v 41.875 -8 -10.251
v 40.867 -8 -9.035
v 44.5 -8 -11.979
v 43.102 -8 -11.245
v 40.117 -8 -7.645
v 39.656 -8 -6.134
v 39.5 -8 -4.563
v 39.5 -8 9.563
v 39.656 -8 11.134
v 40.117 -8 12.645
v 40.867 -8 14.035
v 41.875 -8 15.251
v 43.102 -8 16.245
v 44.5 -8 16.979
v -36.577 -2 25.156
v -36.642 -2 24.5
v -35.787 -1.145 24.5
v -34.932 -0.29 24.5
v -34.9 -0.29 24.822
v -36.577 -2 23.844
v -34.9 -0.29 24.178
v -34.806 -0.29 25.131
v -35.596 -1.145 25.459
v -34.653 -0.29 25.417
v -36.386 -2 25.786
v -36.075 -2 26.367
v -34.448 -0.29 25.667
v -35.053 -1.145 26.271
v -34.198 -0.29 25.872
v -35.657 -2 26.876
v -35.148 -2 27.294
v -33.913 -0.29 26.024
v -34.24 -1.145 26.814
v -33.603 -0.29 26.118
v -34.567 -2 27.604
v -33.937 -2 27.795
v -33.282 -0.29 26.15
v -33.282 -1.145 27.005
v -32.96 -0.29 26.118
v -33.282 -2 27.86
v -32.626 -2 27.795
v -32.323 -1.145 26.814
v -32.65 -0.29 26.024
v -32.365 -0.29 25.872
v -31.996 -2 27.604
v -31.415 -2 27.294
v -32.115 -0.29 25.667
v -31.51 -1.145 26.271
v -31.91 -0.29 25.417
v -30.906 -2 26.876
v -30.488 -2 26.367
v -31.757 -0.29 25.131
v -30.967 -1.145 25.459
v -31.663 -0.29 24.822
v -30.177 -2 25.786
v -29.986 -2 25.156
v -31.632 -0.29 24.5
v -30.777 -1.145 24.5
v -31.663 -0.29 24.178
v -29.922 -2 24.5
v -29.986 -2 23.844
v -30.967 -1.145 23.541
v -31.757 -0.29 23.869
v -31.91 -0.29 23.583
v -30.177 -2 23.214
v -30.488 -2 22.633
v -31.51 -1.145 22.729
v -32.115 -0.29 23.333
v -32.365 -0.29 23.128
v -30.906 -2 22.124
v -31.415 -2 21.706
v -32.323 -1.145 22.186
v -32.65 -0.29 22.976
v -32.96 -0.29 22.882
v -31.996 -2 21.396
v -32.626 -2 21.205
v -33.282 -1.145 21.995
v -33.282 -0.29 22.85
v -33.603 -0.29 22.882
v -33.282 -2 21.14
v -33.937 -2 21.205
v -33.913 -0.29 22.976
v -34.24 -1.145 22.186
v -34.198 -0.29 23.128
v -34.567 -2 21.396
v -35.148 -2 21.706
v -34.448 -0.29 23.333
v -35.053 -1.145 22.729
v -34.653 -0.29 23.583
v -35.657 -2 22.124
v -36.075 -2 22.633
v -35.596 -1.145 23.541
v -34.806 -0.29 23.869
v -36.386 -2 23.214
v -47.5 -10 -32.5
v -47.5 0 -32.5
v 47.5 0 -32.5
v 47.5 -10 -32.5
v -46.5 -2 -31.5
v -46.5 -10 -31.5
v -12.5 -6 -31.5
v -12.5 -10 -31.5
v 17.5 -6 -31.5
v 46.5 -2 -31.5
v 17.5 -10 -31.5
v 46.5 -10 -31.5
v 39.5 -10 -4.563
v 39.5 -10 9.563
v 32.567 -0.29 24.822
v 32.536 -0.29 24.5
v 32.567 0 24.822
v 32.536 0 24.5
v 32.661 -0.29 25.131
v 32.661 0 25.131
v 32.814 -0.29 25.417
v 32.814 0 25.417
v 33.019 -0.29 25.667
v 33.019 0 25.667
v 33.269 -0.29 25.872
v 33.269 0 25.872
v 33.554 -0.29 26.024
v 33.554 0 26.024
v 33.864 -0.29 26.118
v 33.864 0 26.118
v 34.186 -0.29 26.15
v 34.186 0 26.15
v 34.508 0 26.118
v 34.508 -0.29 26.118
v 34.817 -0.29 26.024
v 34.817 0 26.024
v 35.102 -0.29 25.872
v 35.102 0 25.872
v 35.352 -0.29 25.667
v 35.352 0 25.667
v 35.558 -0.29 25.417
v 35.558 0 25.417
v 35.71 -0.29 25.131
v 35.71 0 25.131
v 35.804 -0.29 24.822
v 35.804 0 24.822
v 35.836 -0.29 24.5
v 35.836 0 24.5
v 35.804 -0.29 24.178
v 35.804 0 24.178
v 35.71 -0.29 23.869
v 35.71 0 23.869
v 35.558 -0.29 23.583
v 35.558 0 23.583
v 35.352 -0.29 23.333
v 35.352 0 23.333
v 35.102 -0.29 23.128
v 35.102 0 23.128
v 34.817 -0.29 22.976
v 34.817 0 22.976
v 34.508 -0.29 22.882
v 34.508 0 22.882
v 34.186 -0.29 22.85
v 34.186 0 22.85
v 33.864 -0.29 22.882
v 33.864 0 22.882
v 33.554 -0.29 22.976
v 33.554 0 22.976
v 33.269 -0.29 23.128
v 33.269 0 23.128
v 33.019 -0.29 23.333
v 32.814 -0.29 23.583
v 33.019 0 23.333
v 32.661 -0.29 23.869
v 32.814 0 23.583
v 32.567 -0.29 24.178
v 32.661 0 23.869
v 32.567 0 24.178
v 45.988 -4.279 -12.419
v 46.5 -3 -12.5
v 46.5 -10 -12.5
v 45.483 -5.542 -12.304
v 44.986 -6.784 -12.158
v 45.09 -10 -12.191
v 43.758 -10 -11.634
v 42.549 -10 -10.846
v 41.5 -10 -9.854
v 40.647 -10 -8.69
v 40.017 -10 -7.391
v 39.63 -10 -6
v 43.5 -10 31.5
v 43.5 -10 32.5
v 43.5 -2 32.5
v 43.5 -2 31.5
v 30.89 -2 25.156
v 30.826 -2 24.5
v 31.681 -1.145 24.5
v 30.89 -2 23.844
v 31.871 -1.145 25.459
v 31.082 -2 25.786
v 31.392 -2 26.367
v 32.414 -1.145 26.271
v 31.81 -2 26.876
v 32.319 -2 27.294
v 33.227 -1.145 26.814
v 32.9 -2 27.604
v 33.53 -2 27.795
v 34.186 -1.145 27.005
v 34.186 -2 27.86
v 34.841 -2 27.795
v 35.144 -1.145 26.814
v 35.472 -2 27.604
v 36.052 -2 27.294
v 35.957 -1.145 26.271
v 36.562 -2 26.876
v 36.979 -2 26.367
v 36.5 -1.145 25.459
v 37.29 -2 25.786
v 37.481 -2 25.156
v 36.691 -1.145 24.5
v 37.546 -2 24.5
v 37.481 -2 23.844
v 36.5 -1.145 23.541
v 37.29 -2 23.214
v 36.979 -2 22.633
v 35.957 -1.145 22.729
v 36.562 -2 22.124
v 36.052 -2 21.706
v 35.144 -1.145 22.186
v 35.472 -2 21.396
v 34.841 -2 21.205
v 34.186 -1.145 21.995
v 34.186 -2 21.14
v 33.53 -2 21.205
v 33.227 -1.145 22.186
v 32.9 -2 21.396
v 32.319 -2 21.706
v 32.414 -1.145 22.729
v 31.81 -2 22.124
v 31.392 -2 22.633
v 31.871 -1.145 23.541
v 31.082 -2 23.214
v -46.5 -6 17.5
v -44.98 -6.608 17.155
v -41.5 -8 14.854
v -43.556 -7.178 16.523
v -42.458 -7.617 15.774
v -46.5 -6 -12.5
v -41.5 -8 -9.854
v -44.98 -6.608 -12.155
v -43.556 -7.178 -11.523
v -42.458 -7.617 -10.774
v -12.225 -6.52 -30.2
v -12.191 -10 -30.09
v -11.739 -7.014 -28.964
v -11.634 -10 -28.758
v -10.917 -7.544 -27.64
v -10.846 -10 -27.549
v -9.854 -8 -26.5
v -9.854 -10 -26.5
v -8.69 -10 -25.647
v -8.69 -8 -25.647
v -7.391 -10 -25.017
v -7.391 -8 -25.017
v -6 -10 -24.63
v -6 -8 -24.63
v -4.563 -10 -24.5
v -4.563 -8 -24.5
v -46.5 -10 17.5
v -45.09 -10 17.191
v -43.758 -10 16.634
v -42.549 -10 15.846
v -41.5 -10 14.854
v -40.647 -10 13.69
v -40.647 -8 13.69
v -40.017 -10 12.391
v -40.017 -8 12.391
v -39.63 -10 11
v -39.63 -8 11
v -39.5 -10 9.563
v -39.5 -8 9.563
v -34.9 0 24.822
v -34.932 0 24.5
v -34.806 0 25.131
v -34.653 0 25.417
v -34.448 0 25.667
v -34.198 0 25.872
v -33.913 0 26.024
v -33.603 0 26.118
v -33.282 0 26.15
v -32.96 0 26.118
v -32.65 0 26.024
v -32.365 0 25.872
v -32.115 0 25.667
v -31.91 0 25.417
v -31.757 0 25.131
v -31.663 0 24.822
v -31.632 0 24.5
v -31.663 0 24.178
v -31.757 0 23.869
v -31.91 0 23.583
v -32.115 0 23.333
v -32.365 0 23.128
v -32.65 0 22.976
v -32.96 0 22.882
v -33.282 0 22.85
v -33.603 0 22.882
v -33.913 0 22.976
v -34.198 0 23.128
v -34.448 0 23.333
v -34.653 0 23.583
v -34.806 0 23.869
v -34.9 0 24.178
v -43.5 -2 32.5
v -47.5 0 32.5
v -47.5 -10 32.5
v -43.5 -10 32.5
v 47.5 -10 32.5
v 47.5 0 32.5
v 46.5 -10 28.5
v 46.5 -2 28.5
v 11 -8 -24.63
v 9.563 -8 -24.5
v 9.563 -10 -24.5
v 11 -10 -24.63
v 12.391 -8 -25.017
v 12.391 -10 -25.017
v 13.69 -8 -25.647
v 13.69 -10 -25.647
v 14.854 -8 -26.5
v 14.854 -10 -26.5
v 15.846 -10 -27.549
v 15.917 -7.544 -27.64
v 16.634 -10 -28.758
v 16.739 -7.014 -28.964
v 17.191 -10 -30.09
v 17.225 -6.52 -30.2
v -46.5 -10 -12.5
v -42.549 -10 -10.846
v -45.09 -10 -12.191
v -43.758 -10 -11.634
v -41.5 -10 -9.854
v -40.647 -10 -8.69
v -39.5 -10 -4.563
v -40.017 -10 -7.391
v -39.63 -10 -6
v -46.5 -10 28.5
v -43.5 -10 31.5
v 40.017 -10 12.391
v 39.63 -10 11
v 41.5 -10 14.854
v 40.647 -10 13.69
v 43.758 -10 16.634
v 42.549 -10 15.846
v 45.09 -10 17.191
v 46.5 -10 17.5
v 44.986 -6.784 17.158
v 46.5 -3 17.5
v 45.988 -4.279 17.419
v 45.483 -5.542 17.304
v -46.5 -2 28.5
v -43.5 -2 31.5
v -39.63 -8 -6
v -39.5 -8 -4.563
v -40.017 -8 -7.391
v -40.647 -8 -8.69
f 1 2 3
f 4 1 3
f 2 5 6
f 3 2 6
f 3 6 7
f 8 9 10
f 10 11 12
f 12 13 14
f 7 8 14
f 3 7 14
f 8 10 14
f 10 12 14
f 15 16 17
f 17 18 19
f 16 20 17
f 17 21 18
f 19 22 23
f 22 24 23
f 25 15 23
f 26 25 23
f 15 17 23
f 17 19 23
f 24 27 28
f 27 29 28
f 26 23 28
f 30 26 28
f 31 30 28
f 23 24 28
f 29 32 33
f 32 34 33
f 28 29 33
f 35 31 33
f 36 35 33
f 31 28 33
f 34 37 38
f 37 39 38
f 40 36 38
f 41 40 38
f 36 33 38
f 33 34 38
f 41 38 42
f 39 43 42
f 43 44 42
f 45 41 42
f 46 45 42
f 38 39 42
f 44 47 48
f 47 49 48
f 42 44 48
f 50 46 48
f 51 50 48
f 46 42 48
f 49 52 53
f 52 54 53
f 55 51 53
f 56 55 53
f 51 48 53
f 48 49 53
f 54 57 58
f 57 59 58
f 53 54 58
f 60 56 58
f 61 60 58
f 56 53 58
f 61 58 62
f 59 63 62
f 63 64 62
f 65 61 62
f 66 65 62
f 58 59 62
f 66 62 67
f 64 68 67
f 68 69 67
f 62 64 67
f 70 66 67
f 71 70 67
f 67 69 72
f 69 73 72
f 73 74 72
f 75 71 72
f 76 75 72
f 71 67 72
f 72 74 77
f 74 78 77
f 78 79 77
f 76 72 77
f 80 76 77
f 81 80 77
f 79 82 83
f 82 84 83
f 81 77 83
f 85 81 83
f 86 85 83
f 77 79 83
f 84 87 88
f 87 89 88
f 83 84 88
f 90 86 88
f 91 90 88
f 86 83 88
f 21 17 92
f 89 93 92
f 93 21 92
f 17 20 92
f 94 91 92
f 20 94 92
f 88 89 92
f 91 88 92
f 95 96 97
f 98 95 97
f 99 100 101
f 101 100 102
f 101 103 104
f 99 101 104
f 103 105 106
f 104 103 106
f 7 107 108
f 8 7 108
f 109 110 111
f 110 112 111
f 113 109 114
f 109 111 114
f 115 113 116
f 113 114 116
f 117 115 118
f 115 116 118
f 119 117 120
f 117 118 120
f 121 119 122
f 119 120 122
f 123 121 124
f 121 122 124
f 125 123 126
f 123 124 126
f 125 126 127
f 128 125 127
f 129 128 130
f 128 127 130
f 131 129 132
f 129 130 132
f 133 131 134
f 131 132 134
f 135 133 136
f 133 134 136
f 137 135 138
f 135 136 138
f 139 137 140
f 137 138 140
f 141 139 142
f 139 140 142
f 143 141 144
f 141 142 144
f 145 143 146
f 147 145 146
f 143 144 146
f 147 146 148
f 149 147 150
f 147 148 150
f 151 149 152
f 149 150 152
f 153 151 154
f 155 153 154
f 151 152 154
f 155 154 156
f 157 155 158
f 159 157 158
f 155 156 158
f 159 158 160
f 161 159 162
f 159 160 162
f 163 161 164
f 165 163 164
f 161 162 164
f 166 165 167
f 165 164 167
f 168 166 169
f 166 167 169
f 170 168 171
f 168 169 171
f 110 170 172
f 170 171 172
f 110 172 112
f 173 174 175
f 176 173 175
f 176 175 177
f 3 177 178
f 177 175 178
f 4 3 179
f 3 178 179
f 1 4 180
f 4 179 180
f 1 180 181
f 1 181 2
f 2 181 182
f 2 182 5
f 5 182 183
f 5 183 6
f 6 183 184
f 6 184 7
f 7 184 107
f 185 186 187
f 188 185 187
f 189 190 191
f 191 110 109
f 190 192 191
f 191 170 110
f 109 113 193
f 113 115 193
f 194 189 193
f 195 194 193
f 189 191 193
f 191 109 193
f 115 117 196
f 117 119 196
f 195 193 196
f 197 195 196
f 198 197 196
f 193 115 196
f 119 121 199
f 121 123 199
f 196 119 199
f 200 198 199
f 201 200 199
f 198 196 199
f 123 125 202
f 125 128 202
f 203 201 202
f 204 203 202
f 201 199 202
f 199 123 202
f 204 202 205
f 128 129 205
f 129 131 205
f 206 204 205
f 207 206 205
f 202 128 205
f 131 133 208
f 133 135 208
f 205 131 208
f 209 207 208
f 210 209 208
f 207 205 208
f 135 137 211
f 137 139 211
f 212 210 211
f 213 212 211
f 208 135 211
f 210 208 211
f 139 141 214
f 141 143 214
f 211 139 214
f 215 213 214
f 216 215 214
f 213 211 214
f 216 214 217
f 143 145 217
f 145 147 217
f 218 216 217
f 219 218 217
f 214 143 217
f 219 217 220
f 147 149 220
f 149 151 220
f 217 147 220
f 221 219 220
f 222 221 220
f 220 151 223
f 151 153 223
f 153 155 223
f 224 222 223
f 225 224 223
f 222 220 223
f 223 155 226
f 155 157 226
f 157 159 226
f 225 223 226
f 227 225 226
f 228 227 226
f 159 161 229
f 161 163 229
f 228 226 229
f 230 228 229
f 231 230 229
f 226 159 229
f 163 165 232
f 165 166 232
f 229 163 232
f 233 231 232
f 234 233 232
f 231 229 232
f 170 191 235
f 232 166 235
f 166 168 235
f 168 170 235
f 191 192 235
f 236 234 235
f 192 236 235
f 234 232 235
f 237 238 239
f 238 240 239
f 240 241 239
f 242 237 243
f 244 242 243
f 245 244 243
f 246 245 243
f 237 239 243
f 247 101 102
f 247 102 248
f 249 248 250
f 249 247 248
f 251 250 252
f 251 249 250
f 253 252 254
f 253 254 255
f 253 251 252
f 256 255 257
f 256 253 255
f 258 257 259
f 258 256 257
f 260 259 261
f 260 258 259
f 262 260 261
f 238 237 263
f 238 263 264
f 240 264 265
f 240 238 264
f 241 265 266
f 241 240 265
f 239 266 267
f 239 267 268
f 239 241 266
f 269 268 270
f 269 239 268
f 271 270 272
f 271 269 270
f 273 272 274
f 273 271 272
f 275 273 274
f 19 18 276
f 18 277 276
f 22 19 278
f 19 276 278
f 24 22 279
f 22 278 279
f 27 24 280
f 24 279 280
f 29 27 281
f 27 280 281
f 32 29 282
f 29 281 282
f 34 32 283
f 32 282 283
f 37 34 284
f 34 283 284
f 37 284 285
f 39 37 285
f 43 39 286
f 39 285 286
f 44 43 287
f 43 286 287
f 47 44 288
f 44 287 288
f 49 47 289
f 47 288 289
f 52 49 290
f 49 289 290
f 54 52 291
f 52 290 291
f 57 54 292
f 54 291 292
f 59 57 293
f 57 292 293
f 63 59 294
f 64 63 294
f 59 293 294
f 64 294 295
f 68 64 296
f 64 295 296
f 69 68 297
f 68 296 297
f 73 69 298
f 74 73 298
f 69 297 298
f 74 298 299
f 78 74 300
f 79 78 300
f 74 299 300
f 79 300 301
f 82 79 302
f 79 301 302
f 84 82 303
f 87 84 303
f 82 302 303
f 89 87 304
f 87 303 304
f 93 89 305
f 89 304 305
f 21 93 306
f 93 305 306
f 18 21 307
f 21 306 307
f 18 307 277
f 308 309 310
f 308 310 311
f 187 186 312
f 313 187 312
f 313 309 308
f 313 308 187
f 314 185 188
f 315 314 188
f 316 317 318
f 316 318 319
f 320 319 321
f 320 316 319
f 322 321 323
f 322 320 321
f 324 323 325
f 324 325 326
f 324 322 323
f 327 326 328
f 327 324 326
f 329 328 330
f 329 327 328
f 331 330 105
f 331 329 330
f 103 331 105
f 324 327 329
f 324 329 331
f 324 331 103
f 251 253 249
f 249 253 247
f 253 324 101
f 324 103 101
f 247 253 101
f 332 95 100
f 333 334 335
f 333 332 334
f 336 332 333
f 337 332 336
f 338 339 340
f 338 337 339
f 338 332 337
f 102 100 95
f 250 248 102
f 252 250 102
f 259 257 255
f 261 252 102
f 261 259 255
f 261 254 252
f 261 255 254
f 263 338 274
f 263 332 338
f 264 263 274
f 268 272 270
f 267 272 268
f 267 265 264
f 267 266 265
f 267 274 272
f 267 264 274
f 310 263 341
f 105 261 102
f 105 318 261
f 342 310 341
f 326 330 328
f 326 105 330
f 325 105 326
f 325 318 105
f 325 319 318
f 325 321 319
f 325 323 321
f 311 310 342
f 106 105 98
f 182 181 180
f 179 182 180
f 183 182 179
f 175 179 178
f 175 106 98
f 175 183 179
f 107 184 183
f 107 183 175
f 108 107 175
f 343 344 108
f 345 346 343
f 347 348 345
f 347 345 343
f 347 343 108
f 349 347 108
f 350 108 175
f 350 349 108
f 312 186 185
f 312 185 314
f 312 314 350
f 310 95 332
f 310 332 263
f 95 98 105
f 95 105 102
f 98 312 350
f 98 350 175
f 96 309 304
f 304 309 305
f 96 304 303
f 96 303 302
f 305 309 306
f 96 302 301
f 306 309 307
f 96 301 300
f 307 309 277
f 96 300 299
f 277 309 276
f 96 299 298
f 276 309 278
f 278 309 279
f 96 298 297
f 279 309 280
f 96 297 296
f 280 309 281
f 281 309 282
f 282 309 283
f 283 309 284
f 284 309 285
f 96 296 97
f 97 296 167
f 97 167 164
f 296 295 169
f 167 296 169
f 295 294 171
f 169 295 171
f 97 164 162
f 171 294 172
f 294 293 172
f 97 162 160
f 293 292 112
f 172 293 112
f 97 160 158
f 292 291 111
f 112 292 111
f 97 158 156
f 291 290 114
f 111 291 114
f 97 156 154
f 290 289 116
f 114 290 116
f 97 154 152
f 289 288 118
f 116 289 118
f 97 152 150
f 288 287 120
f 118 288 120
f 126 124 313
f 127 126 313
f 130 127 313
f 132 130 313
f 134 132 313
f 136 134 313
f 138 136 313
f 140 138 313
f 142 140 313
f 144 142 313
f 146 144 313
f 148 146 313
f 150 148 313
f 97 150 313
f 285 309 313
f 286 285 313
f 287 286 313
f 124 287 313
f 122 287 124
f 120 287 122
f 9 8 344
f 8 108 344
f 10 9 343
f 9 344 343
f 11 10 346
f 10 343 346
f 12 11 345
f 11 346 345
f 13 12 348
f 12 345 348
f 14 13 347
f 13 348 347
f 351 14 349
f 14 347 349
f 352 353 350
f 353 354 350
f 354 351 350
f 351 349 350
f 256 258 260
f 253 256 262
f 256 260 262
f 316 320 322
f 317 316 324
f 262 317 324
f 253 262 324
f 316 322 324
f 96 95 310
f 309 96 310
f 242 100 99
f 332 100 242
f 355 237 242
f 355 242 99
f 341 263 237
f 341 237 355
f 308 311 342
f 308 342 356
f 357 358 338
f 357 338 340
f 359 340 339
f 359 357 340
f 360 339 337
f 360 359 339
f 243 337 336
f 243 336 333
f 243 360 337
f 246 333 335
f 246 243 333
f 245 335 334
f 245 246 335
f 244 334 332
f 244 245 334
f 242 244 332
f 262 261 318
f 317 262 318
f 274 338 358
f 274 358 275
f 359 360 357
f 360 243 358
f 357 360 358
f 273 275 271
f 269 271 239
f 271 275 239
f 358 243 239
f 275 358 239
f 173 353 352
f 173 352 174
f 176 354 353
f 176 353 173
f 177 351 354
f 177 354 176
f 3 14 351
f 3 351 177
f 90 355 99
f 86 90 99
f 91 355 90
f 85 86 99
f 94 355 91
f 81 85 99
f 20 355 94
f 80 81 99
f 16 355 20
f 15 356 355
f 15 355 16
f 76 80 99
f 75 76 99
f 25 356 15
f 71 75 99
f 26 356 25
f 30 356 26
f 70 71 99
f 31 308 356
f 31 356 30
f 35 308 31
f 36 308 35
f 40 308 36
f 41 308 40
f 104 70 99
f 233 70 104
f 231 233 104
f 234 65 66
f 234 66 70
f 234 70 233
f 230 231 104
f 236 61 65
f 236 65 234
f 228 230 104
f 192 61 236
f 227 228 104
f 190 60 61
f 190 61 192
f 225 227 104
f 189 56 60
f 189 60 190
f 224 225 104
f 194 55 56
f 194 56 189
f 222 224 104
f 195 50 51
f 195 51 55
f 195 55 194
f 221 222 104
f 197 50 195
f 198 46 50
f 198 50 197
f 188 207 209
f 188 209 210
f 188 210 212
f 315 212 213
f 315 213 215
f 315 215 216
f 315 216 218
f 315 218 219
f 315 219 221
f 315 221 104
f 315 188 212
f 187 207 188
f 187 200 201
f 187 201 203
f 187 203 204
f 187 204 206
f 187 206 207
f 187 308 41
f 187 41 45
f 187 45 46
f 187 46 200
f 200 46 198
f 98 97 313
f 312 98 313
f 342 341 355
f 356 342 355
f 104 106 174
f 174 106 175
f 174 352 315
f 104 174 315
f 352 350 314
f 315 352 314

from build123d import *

# Parameters (mm, degrees)
F0_W            = 95
F0_H            = 65
F1_DEPTH        = 10
F2_W            = 93
F2_H            = 63
F3_DEPTH        = 8
F4_W            = 8
F4_H            = 30
F4_W_2          = 30
F4_H_2          = 8
F5_DEPTH        = 2
F6_T1_DEPTH     = 21.843134833
F6_T6_DEPTH     = 41.686269666
F6_T11_DEPTH    = 41.686269666
F7_C1_SIZE2     = 2
F7_C1_SIZE      = 5
F7_C2_SIZE2     = 5
F7_C2_SIZE      = 2
F7_C3_SIZE2     = 2
F7_C3_SIZE      = 5
F8_W            = 87
F8_H            = 8
F9_DEPTH        = 10
F10_SIZE        = 2.99999
F12_D           = 3.3
F12_CSINK_D     = 6.72
F12_CSINK_ANGLE = 90


# Not quite as in the source:
# - a fillet or chamfer that OpenCascade refuses, or shapes differently, is made with other operations: its cross-section is extruded or revolved along the edge and cut away or added
# - a fillet or chamfer is up to 0.001 mm smaller than in the source, because OpenCascade refuses the exact size


with BuildPart() as f1:
    # F0 (on Front) → F1 (new body)
    with BuildSketch(Plane.XZ):
        Rectangle(F0_W, F0_H)
    extrude(amount=F1_DEPTH)

    # F2 (on face) → F3 (cut)
    with BuildSketch(Plane.XZ.offset(10)):
        Rectangle(F2_W, F2_H)
    extrude(amount=-F3_DEPTH, mode=Mode.SUBTRACT)

    # F4 (on face) → F5 (join)
    with BuildSketch(Plane.XZ.offset(10)):
        with Locations((-43.5, 2.5)):
            Rectangle(F4_W, F4_H)
        with Locations((43.5, 2.5)):
            Rectangle(F4_W, F4_H)
        with Locations((2.5, -28.5)):
            Rectangle(F4_W_2, F4_H_2)
    extrude(amount=-F5_DEPTH)

    # F6: fillet of radius 8 on 6 edges, made by hand

    # F6_s2 → F6_t1 (cut)
    with BuildSketch(Plane.XZ.offset(8)):
        with BuildLine():
            ThreePointArc((-39.5, -4.5627460668), (-41.5, -9.8542486889), (-46.5, -12.5))
            Line((-46.5, -12.5), (-39.5, -12.5))
            Line((-39.5, -12.5), (-39.5, -4.5627460668))
        make_face()
        with BuildLine():
            ThreePointArc((-46.5, 17.5), (-41.5, 14.8542486889), (-39.5, 9.5627460668))
            Line((-39.5, 9.5627460668), (-39.5, 17.5))
            Line((-39.5, 17.5), (-46.5, 17.5))
        make_face()
        with BuildLine():
            ThreePointArc((-12.5, -31.5), (-9.8542486889, -26.5), (-4.5627460668, -24.5))
            Line((-4.5627460668, -24.5), (-12.5, -24.5))
            Line((-12.5, -24.5), (-12.5, -31.5))
        make_face()
        with BuildLine():
            ThreePointArc((9.5627460668, -24.5), (14.8542486889, -26.5), (17.5, -31.5))
            Line((17.5, -31.5), (17.5, -24.5))
            Line((17.5, -24.5), (9.5627460668, -24.5))
        make_face()
    extrude(amount=F6_T1_DEPTH, mode=Mode.SUBTRACT)


with BuildPart() as f6_tool4:
    # F6_s5 → F6_t6 (new body)
    with BuildSketch(Plane.XZ.offset(29.843134833)):
        with BuildLine():
            ThreePointArc((39.5, 9.5627460668), (41.5, 14.8542486889), (46.5, 17.5))
            Line((46.5, 17.5), (39.5, 17.5))
            Line((39.5, 17.5), (39.5, 9.5627460668))
        make_face()
    extrude(amount=-F6_T6_DEPTH)

    split(bisect_by=Plane.XZ.offset(2), keep=Keep.TOP)


with BuildPart() as f1_1:
    add(f1.part)

    # F6_t3: cut F6_tool4
    add(f6_tool4.part, mode=Mode.SUBTRACT)


with BuildPart() as f6_tool9:
    # F6_s10 → F6_t11 (new body)
    with BuildSketch(Plane.XZ.offset(29.843134833)):
        with BuildLine():
            ThreePointArc((46.5, -12.5), (41.5, -9.8542486889), (39.5, -4.5627460668))
            Line((39.5, -4.5627460668), (39.5, -12.5))
            Line((39.5, -12.5), (46.5, -12.5))
        make_face()
    extrude(amount=-F6_T11_DEPTH)

    split(bisect_by=Plane.XZ.offset(2), keep=Keep.TOP)


with BuildPart() as f1_2:
    add(f1_1.part)

    # F6_t8: cut F6_tool9
    add(f6_tool9.part, mode=Mode.SUBTRACT)

    # F7: chamfer of 2 x 5 on 3 edges, made by hand

    # F7_c1
    f7_c1_edges = [f1_2.edges().sort_by_distance(p)[0] for p in [
        (2.5, -8, -31.5),
    ]]
    f7_c1_side = f1_2.faces().sort_by_distance((2.5, -8, -31.46))[0]
    chamfer(f7_c1_edges, length=F7_C1_SIZE, length2=F7_C1_SIZE2, reference=f7_c1_side)

    # F7_c2
    f7_c2_edges = [f1_2.edges().sort_by_distance(p)[0] for p in [
        (-46.5, -8, 2.5),
    ]]
    f7_c2_side = f1_2.faces().sort_by_distance((-46.5, -7.96, 2.5))[0]
    chamfer(f7_c2_edges, length=F7_C2_SIZE, length2=F7_C2_SIZE2, reference=f7_c2_side)

    # F7_c3
    f7_c3_edges = [f1_2.edges().sort_by_distance(p)[0] for p in [
        (46.5, -8, 2.5),
    ]]
    f7_c3_side = f1_2.faces().sort_by_distance((46.5, -7.96, 2.5))[0]
    chamfer(f7_c3_edges, length=F7_C3_SIZE, length2=F7_C3_SIZE2, reference=f7_c3_side)

    # F8 (on face) → F9 (cut)
    with BuildSketch(Plane.XY.offset(32.5)):
        with Locations((0, -6)):
            Rectangle(F8_W, F8_H)
    extrude(amount=-F9_DEPTH, mode=Mode.SUBTRACT)

    # F10 (size 3 in the source; OpenCascade refuses exactly that, so slightly less here)
    f10_edges = [f1_2.edges().sort_by_distance(p)[0] for p in [
        (-46.5, -6, 31.5),
        (46.5, -6, 31.5),
    ]]
    chamfer(f10_edges, length=F10_SIZE)

    # F12 (through all)
    with Locations(Plane.XZ.offset(2)):
        with Locations((34.1857404726, 24.5), (-33.2815715389, 24.5)):
            CounterSinkHole(F12_D / 2, F12_CSINK_D / 2, counter_sink_angle=F12_CSINK_ANGLE)


solid = f1_2.part
